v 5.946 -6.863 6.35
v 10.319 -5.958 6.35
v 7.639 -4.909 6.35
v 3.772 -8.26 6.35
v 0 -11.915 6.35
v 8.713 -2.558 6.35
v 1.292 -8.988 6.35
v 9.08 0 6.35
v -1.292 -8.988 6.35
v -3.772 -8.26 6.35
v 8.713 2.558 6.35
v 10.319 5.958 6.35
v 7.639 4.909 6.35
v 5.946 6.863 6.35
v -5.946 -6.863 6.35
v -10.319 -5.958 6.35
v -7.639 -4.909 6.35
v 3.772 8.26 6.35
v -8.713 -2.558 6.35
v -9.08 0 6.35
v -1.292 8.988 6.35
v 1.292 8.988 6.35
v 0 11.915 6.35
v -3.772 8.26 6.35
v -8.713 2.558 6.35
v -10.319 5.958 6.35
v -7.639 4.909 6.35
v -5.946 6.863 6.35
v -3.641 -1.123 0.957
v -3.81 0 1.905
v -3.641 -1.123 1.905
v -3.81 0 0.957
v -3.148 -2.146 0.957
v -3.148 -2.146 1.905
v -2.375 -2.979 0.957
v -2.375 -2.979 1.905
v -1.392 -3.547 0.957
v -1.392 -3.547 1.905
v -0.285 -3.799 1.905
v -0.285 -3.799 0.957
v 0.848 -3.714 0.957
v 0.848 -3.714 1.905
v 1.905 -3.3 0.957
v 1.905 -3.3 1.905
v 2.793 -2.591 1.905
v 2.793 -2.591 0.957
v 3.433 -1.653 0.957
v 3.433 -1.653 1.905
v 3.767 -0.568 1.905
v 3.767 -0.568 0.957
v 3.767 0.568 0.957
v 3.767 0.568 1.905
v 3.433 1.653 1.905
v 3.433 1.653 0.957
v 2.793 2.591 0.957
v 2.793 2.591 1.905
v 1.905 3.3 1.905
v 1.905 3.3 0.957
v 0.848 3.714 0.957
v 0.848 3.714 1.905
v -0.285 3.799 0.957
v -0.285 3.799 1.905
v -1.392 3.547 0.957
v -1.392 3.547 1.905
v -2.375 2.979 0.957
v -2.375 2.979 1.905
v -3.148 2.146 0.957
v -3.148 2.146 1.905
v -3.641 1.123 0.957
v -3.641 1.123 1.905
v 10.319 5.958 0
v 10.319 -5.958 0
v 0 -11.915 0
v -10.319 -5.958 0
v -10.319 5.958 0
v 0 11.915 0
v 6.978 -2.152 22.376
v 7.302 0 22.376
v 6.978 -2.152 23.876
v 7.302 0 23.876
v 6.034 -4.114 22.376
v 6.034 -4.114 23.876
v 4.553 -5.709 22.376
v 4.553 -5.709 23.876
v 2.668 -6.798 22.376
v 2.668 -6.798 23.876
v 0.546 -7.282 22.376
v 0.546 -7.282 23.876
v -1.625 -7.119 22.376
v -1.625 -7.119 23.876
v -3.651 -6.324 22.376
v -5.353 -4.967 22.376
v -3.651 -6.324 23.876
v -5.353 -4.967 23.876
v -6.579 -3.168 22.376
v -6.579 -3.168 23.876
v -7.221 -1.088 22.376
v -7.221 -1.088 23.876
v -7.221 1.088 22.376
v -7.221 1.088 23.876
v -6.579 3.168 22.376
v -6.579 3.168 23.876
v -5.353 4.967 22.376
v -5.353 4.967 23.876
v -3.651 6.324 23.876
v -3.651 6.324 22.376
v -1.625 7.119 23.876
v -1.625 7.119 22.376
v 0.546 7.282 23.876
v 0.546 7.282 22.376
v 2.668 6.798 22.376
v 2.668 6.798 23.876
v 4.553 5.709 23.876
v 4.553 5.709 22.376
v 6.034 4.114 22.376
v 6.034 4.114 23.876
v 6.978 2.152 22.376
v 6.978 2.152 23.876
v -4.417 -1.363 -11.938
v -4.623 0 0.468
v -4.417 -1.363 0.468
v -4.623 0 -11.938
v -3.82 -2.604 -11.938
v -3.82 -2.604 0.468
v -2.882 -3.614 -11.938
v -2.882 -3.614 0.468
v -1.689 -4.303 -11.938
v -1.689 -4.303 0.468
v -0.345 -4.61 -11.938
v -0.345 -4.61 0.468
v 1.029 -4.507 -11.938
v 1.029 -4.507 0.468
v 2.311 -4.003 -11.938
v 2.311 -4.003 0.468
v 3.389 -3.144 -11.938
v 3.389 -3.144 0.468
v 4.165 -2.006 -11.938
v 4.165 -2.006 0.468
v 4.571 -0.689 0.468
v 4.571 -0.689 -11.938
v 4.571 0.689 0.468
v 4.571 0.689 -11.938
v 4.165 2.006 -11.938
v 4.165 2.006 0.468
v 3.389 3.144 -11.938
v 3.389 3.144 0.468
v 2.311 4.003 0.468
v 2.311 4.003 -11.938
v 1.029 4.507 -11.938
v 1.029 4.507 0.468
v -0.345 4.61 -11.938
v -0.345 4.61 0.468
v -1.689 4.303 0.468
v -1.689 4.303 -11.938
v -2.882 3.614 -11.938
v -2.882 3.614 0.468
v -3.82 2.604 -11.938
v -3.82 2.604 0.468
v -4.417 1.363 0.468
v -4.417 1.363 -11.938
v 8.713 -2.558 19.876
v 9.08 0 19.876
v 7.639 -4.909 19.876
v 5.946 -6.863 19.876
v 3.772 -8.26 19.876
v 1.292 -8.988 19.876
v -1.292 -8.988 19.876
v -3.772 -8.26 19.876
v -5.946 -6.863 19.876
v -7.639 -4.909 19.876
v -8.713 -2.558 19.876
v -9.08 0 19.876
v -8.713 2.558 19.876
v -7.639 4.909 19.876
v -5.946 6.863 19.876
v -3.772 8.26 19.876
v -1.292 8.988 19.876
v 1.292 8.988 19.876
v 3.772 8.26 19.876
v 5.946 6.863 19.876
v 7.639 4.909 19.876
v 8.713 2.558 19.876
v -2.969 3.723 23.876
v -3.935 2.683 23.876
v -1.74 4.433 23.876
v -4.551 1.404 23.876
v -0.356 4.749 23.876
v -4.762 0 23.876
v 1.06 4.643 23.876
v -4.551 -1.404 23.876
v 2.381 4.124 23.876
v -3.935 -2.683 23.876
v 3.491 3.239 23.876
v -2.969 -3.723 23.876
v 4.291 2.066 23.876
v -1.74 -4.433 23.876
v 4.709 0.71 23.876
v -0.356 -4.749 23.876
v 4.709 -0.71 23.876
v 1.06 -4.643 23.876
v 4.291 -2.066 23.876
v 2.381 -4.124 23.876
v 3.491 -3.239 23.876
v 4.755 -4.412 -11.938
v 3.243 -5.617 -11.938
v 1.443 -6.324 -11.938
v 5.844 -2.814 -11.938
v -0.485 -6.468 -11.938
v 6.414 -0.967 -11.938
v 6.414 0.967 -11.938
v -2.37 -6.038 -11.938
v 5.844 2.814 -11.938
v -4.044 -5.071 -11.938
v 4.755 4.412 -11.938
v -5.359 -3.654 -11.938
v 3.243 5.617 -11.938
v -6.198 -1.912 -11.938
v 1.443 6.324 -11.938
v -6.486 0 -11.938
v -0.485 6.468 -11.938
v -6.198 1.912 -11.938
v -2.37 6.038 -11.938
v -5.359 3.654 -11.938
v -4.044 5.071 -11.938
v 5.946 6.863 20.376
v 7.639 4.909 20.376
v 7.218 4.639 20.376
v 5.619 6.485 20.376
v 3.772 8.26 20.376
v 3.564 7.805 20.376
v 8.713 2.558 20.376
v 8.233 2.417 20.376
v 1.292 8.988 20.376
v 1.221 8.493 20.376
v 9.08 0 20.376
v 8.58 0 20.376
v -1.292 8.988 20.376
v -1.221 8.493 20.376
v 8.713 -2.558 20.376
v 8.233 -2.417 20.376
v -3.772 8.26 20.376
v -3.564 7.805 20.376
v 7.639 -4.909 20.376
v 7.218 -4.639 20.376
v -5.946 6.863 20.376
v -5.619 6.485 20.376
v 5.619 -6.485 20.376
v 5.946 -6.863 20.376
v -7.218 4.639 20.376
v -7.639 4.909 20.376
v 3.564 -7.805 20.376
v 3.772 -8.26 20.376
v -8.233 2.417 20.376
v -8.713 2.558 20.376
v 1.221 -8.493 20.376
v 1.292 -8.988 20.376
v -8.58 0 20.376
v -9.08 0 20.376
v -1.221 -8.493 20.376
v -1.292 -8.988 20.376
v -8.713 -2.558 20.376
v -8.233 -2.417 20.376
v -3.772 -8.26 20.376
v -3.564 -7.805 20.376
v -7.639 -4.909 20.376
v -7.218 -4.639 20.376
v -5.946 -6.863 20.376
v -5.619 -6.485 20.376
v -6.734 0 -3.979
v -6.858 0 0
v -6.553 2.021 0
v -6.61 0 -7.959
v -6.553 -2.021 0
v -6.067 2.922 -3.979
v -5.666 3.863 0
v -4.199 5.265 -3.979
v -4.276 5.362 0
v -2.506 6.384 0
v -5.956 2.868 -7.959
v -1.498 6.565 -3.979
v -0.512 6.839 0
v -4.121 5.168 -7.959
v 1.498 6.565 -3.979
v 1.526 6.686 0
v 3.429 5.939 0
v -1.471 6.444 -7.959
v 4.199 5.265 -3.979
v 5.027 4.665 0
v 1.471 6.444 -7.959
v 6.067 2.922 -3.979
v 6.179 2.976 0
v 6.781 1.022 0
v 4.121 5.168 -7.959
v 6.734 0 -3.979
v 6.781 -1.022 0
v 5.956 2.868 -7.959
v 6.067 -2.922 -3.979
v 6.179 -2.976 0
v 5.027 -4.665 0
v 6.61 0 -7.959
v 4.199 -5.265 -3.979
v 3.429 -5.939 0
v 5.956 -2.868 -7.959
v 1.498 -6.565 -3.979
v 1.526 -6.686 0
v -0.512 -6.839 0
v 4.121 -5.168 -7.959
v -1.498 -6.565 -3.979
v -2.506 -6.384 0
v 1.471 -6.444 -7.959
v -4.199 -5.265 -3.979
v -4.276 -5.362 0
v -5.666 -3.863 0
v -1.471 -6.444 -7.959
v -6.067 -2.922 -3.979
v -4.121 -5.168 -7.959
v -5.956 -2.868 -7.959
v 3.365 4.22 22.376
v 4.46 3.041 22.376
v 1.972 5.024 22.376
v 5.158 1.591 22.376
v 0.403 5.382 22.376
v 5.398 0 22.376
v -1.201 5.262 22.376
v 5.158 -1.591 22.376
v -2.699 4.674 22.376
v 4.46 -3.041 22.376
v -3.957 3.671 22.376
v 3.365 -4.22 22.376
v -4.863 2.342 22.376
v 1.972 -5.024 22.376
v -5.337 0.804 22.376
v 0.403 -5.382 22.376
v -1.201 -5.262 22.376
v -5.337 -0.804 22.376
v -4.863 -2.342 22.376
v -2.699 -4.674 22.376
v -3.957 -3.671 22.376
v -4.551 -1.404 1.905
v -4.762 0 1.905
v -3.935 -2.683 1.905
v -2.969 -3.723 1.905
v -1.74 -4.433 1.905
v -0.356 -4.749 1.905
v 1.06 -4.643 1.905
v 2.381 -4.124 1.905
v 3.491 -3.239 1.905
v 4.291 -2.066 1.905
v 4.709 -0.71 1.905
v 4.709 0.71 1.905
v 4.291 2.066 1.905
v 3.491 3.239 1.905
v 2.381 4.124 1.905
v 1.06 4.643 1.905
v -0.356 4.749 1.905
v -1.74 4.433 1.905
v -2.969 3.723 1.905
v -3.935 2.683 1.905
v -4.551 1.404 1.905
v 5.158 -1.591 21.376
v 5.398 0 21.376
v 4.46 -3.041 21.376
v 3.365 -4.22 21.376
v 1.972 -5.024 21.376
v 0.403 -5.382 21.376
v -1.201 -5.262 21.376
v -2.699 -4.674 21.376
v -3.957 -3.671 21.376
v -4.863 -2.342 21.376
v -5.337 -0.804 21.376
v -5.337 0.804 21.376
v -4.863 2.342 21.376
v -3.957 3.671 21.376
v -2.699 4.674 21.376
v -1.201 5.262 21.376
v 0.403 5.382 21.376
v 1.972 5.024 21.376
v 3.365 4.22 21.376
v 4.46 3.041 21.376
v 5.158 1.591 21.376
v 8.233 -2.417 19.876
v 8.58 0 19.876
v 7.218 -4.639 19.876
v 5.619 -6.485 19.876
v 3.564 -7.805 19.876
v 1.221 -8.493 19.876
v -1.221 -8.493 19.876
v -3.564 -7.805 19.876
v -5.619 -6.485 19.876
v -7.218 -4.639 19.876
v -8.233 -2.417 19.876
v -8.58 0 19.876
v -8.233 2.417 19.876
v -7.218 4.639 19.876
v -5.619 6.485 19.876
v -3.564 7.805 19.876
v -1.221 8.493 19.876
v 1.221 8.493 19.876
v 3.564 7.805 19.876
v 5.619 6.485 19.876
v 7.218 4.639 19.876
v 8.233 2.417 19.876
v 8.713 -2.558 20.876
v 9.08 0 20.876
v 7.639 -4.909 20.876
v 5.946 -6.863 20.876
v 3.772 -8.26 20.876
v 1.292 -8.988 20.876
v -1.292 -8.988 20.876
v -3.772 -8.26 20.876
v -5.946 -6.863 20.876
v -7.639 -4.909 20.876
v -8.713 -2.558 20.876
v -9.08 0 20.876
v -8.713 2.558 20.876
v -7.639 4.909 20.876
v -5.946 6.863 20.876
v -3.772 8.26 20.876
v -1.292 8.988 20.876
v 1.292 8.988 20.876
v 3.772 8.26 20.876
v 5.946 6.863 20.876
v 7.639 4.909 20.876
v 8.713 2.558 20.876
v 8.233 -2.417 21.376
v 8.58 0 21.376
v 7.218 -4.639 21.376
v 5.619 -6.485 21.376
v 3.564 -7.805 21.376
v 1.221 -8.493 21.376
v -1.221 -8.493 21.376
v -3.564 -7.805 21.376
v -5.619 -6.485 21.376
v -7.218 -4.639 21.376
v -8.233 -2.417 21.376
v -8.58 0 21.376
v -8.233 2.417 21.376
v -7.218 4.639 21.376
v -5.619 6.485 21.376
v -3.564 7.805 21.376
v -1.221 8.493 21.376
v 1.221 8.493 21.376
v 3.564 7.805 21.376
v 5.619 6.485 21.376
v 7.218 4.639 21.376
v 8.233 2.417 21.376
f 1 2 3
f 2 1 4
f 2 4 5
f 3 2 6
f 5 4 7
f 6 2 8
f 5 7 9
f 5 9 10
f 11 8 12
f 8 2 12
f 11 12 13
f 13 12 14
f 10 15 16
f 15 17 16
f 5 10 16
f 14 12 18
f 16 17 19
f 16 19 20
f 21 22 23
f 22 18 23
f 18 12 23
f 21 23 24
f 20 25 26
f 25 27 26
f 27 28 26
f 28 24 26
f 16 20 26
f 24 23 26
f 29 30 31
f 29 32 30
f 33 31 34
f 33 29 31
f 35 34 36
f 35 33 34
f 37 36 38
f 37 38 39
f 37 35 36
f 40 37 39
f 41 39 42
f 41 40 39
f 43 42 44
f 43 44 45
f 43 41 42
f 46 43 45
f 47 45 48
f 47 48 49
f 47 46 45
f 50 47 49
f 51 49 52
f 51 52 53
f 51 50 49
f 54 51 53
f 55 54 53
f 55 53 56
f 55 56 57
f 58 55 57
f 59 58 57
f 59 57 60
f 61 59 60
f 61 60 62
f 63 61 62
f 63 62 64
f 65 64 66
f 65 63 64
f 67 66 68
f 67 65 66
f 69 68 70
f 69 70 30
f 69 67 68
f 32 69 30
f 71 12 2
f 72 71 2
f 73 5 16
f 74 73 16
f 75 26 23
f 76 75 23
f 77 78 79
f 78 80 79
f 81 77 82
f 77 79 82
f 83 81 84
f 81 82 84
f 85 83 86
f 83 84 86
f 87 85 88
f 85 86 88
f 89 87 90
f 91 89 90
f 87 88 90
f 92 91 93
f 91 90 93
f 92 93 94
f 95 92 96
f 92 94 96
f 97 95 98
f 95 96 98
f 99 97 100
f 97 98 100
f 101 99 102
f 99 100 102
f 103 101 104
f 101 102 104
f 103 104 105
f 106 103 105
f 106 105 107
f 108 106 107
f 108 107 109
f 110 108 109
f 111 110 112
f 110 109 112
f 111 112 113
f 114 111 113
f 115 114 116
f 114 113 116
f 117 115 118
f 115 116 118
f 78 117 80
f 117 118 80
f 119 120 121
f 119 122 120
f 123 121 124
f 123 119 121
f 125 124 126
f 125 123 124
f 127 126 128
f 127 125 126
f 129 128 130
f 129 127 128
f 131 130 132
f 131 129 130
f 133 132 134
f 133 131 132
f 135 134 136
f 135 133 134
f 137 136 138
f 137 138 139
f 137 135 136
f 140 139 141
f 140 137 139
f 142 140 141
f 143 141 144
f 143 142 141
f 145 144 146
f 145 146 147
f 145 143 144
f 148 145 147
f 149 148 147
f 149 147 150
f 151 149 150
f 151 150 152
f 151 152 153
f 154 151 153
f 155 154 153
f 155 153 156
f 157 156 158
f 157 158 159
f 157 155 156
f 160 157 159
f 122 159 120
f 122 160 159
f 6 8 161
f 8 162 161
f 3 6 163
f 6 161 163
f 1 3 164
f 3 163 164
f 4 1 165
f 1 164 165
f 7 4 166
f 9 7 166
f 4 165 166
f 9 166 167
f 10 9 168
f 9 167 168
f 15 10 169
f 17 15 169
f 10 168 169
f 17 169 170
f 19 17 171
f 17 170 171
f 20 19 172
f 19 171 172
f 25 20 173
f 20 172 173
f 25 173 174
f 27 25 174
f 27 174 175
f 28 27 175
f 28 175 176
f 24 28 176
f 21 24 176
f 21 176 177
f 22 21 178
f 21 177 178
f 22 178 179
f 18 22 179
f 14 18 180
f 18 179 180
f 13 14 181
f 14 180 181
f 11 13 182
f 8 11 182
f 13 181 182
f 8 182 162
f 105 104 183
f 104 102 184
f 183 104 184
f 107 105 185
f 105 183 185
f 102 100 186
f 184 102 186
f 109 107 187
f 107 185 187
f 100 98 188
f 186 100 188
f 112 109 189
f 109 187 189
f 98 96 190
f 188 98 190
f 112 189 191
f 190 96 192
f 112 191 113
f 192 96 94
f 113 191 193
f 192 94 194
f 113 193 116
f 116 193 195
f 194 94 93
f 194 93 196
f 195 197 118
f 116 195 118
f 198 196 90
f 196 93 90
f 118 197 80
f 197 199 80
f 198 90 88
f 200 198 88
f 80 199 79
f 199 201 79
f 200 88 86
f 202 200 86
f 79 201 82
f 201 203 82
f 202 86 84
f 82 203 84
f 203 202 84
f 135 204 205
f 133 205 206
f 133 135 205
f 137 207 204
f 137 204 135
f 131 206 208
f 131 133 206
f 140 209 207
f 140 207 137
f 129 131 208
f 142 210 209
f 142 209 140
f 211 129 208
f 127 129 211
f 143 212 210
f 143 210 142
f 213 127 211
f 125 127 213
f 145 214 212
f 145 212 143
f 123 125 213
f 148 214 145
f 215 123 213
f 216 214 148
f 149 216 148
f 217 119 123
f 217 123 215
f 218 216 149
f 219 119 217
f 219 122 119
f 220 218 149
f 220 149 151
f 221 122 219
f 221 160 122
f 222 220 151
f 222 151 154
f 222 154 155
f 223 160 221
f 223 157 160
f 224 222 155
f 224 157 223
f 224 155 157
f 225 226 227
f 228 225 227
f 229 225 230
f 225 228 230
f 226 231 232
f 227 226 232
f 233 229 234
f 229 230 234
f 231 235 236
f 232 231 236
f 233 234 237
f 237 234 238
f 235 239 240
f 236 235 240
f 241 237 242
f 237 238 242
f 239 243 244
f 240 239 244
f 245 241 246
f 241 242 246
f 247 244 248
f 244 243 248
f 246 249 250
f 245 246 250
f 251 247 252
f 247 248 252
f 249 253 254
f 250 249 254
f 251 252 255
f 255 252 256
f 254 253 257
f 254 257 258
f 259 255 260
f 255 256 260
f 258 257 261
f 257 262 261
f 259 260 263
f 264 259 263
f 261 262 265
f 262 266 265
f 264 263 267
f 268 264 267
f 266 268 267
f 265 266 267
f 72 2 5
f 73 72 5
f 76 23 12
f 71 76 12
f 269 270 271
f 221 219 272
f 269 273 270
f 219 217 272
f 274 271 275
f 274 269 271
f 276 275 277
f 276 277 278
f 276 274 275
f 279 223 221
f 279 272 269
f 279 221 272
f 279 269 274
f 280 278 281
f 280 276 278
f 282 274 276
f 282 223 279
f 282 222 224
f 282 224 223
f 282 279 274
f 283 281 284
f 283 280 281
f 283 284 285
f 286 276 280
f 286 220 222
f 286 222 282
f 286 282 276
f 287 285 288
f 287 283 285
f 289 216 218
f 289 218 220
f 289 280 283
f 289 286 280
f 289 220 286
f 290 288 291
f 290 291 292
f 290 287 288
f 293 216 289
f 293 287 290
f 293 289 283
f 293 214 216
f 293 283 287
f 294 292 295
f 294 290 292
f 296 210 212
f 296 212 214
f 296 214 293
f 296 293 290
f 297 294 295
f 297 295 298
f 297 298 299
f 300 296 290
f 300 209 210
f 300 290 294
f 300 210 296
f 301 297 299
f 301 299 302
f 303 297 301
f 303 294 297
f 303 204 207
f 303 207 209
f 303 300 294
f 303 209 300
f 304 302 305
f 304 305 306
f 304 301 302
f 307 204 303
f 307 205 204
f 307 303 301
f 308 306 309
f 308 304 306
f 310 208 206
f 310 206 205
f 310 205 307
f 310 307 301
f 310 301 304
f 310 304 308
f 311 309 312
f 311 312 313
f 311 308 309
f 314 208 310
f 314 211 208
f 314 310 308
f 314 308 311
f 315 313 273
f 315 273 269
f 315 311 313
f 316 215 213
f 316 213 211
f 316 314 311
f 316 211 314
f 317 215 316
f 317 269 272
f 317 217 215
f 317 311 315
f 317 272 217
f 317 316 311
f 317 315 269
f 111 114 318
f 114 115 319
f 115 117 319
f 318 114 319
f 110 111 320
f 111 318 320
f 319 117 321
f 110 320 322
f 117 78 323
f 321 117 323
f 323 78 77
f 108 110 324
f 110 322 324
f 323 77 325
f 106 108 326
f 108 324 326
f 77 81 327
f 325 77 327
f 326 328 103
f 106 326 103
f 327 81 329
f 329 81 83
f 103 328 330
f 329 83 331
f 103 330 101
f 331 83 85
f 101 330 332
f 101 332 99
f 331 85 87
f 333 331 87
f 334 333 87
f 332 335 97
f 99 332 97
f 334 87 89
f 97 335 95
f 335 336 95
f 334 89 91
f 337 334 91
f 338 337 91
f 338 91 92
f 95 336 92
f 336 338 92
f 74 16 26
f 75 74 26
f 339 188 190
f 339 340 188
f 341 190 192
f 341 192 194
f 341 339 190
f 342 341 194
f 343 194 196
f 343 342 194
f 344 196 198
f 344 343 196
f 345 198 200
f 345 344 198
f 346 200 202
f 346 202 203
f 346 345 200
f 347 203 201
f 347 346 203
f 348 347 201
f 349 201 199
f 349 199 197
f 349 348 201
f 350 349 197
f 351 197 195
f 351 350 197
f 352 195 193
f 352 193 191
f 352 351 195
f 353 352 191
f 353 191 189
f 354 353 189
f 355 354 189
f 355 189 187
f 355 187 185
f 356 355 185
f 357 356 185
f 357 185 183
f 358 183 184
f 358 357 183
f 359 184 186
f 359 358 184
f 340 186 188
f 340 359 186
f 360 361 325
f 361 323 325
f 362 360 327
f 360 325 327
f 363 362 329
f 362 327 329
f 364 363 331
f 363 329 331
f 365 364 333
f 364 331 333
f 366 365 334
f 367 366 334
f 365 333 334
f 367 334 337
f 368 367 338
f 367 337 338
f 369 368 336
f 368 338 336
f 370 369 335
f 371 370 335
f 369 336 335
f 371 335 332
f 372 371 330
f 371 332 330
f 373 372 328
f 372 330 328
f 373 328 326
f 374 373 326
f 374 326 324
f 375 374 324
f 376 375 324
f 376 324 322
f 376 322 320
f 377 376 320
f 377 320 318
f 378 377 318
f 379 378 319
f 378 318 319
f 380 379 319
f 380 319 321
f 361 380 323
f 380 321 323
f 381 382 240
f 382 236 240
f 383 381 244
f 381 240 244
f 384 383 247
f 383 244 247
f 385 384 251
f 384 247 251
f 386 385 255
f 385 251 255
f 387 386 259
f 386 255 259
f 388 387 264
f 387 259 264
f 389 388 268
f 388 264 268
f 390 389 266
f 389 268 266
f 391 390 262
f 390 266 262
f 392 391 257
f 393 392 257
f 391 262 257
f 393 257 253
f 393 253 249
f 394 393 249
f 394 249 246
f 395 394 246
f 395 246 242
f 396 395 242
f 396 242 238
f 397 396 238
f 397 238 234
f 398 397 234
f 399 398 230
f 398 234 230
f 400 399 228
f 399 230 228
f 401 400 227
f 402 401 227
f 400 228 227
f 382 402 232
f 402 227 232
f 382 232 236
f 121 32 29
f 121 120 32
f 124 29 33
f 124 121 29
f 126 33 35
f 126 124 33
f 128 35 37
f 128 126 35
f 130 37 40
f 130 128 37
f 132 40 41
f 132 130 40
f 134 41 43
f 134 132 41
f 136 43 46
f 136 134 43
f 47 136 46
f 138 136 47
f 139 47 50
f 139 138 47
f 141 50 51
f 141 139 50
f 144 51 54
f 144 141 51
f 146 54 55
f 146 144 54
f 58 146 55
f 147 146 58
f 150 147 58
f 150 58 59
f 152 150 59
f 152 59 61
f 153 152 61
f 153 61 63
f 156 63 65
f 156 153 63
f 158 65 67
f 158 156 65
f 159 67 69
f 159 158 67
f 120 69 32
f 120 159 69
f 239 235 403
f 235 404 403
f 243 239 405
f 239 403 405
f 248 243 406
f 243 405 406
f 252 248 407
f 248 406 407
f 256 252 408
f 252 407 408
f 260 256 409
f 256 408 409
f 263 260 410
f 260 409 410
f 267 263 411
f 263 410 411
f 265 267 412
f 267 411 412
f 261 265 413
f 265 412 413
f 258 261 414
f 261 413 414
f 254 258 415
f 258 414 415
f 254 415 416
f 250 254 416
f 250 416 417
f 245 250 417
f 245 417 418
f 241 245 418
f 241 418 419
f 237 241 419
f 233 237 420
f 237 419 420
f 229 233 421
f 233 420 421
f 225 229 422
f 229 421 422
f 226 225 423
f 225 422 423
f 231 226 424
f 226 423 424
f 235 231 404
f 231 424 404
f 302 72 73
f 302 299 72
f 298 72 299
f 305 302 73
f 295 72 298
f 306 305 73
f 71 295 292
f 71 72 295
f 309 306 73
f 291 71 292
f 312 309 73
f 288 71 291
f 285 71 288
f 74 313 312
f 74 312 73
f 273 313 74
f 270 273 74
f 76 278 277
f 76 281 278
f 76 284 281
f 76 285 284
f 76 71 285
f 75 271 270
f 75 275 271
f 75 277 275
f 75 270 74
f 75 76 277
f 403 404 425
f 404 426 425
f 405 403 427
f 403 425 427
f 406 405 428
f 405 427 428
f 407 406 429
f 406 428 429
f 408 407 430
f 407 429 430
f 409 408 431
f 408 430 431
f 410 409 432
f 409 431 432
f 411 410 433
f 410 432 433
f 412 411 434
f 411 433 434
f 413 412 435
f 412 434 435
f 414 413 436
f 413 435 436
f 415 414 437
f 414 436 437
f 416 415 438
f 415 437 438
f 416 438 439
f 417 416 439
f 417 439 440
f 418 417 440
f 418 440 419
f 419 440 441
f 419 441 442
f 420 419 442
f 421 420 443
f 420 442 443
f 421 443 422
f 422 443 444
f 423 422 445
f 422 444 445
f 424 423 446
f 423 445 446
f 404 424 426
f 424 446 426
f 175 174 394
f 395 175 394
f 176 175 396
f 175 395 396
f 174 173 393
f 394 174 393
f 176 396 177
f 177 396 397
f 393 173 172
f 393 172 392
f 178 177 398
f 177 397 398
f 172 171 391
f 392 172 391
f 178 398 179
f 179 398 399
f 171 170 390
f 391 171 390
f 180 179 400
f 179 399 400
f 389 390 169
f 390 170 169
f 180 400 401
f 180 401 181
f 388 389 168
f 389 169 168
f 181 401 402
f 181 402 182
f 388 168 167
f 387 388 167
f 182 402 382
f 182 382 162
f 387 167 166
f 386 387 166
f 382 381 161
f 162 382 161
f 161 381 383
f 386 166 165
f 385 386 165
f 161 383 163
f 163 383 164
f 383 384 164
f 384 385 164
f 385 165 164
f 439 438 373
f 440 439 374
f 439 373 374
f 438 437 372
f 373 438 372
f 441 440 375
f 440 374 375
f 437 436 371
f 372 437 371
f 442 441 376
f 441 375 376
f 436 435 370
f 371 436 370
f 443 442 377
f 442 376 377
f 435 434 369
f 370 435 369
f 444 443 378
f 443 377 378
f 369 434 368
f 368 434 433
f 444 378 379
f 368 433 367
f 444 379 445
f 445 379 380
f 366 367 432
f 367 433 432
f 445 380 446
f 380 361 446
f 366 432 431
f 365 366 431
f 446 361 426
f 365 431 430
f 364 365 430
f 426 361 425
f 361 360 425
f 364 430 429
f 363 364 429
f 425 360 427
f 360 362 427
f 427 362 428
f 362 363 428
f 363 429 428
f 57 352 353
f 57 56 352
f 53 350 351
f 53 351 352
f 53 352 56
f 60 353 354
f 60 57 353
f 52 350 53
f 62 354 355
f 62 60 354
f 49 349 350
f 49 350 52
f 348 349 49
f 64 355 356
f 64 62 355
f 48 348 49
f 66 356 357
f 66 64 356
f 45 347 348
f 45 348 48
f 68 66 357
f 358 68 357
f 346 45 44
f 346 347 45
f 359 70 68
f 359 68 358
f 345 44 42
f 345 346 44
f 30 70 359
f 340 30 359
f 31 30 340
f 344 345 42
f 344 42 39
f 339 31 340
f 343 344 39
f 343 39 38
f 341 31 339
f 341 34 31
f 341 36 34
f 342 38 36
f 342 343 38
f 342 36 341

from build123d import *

# Parameters (mm, degrees)
BOSS_EXTRUDE1_DEPTH = 6.35
SKETCH5_R           = 6.858
BOSS_EXTRUDE2_DEPTH = 11.938
BOSS_EXTRUDE2_TAPER = 1.783333333


with BuildPart() as part:
    # Sketch2 → Revolve1 (revolve)
    with BuildSketch(Plane(origin=(0, 0, 0), x_dir=(0, 0, -1), z_dir=(1, 0, 0)), mode=Mode.PRIVATE) as revolve1_sk:
        Polygon((-23.876, 0), (-6.35, 0), (-6.35, 9.0805), (-19.876, 9.0805), (-19.876, 8.5805), (-20.376, 8.5805), (-20.376, 9.0805), (-20.876, 9.0805), (-21.376, 8.5805), (-21.376, 5.3975), (-22.376, 5.3975), (-22.376, 7.3025), (-23.876, 7.3025), align=None)
    revolve(revolve1_sk.sketch.rotate(Axis((0, 0, 23.876), (0, 0, -1)), 90), axis=Axis((0, 0, 23.876), (0, 0, -1)))

    # Sketch3 → Boss-Extrude1 (add)
    with BuildSketch(Plane(origin=(0, 0, 6.35), x_dir=(-1, 0, 0), z_dir=(0, 0, -1))):
        Polygon((0, 11.91506618), (-10.31875, 5.95753309), (-10.31875, -5.95753309), (0, -11.91506618), (10.31875, -5.95753309), (10.31875, 5.95753309), align=None)
    extrude(amount=BOSS_EXTRUDE1_DEPTH)


with BuildPart() as body_2:
    # Sketch5 → Boss-Extrude2 (new body)
    with BuildSketch(Plane(origin=(0, 0, 0), x_dir=(-1, 0, 0), z_dir=(0, 0, -1))):
        Circle(SKETCH5_R)
    extrude(amount=BOSS_EXTRUDE2_DEPTH, taper=BOSS_EXTRUDE2_TAPER)


with BuildPart() as part_1:
    add(part.part)

    # Combine1: union body 2
    add(body_2.part)

    # Sketch9 → Cut-Revolve2 (revolve, cut)
    with BuildSketch(Plane(origin=(0, 0, 0), x_dir=(0, 0, -1), z_dir=(1, 0, 0)), mode=Mode.PRIVATE) as cut_revolve2_sk:
        Polygon((-23.876, 4.7625), (-1.905, 4.7625), (-1.905, 3.81), (-0.956760375, 3.81), (-0.468380864, 4.6228), (11.938, 4.6228), (11.938, 0), (-23.876, 0), align=None)
    revolve(cut_revolve2_sk.sketch.rotate(Axis((0, 0, -11.938), (0, 0, 1)), 90), axis=Axis((0, 0, -11.938), (0, 0, 1)), mode=Mode.SUBTRACT)


solid = part_1.part
